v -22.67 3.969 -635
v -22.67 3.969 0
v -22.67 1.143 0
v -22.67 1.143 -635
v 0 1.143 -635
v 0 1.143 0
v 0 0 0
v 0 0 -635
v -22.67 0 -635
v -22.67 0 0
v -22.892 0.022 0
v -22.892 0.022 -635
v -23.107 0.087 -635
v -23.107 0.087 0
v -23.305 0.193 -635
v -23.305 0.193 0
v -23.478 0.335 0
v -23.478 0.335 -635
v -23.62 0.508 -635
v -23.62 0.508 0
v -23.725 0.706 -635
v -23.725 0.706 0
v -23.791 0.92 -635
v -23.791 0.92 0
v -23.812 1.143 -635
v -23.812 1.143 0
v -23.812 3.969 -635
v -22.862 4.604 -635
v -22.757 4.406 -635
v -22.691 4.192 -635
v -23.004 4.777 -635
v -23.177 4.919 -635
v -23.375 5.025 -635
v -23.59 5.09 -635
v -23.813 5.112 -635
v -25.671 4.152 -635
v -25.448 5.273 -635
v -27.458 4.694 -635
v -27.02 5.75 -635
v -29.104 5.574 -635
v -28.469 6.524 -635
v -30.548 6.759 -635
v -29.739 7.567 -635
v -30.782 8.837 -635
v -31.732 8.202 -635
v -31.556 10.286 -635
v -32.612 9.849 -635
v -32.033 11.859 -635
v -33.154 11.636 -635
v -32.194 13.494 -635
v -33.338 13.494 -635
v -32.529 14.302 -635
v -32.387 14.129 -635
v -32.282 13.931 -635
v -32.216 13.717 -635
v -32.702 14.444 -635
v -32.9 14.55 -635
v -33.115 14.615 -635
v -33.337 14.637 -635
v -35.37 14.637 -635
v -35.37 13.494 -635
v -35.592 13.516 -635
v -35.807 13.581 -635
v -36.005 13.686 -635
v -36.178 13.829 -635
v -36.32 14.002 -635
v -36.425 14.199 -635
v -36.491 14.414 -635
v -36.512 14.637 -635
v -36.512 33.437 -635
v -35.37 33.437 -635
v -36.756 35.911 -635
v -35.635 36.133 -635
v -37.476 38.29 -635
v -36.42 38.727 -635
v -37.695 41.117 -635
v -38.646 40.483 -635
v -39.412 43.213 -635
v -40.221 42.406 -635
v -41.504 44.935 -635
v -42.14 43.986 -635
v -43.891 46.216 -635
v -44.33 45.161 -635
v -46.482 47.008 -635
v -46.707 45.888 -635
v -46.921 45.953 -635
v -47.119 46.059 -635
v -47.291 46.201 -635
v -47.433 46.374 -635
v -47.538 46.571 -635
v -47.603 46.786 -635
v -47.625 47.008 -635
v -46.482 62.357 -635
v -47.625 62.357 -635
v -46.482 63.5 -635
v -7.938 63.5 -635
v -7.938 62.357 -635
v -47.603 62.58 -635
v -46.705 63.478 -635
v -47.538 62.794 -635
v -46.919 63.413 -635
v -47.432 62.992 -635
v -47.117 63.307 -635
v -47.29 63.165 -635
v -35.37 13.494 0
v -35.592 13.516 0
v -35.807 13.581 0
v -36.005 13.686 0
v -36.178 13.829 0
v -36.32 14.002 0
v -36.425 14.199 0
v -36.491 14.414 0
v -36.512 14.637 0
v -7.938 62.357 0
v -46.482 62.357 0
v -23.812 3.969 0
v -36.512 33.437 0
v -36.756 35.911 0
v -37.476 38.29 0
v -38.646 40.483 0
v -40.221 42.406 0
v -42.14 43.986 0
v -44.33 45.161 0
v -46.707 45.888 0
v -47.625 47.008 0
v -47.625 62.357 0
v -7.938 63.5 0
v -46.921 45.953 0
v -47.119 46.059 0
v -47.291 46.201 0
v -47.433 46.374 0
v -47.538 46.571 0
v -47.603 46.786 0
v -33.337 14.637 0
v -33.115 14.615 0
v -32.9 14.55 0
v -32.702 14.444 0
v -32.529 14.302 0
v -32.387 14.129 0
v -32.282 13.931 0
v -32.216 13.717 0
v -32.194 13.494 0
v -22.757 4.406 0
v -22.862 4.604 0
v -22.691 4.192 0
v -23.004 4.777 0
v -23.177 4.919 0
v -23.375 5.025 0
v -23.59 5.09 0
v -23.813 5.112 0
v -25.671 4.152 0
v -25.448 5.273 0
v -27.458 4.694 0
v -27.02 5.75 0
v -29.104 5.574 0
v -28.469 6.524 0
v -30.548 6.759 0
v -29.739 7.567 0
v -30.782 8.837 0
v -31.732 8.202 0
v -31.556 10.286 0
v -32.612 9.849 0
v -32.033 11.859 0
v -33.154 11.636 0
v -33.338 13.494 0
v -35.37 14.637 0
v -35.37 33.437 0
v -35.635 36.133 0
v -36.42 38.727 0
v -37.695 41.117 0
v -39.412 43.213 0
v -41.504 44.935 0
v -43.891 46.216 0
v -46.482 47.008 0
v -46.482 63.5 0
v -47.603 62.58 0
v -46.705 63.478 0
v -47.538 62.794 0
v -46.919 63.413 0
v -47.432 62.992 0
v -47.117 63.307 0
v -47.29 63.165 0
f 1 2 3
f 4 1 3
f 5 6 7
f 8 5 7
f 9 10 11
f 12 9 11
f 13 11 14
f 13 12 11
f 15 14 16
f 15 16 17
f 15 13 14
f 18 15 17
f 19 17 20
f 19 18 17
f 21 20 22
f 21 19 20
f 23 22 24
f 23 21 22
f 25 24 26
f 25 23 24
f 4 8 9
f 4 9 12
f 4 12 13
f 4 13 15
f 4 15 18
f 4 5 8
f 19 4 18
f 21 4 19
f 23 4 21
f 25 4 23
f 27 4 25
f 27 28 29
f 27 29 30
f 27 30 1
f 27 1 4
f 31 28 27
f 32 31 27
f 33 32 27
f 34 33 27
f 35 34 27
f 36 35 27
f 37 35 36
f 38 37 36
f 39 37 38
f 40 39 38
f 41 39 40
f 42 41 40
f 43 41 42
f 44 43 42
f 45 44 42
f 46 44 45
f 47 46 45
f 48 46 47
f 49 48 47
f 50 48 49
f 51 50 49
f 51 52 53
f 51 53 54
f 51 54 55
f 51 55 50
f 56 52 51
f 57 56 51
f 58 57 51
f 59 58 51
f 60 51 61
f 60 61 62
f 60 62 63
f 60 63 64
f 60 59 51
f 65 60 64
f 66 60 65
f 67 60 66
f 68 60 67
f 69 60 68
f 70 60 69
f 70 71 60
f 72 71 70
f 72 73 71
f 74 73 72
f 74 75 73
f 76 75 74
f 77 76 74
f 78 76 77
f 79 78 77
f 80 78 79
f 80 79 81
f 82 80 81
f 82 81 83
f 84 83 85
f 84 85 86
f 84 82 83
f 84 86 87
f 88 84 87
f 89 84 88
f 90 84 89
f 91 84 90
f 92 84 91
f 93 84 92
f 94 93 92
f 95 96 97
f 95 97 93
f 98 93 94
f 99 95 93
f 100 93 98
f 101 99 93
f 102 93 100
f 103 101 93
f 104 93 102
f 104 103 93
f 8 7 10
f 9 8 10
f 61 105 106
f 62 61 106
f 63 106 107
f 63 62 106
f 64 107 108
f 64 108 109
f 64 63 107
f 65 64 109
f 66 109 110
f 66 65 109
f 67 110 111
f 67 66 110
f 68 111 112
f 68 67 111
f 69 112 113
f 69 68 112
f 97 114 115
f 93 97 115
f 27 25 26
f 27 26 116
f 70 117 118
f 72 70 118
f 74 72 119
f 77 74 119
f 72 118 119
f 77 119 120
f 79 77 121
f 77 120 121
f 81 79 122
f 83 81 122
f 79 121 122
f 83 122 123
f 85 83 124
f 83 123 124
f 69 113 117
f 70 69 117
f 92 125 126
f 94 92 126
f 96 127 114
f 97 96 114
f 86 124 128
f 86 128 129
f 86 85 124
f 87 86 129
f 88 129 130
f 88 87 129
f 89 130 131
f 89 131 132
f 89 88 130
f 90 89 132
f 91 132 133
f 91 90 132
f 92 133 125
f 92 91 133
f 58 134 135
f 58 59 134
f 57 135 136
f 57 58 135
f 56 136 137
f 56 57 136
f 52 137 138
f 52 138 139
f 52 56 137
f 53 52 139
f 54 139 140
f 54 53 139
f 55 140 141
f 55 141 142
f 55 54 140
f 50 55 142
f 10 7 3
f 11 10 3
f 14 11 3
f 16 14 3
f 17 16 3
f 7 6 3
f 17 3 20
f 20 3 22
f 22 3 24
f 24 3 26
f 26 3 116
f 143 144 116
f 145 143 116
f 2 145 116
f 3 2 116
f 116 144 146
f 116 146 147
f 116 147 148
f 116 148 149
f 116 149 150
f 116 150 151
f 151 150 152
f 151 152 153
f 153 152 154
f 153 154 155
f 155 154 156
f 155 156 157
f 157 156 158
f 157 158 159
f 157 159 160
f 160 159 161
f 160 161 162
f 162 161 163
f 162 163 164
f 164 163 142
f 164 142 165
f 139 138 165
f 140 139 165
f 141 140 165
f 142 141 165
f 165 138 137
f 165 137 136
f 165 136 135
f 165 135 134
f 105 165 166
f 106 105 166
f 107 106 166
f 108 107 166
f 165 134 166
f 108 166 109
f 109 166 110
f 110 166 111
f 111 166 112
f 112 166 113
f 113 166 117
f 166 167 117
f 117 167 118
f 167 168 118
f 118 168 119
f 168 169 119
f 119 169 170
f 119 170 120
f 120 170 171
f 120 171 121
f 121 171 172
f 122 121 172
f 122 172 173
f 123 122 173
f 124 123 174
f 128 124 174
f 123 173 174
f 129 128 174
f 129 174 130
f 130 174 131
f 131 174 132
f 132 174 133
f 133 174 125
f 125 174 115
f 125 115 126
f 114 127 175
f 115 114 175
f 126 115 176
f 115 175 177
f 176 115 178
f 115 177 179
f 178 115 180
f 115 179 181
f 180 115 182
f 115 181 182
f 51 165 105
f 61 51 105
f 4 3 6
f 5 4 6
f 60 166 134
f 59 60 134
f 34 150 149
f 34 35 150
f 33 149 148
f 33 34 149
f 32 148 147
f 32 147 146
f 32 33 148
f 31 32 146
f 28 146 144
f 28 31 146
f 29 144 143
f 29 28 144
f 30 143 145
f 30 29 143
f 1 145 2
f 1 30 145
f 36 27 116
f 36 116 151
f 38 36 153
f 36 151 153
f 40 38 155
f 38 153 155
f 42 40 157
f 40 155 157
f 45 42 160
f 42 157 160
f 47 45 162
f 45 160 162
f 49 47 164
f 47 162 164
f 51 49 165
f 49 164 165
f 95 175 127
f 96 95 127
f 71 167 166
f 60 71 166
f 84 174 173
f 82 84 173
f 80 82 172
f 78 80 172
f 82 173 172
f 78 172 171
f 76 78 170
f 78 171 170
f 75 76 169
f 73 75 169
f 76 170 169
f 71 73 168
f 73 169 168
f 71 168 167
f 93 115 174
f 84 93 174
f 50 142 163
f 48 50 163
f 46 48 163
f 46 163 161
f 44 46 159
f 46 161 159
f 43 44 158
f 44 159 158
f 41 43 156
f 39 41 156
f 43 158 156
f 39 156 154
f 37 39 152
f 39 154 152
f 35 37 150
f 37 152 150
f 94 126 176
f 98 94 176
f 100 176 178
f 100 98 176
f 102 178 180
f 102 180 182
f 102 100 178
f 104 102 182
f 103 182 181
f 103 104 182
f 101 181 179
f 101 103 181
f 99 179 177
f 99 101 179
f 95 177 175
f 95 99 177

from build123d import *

# Parameters (mm, degrees)
EXTRUDE_THIN1_DEPTH = 635
FILLET1_R           = 1.143


with BuildPart() as part:
    # Sketch1 → Extrude-Thin1 (new body)
    with BuildSketch(Plane.XY):
        with BuildLine():
            Line((0, 0), (-23.8125, 0))
            Line((-23.8125, 0), (-23.8125, 3.96875))
            ThreePointArc((-23.8125, 3.96875), (-30.547692, 6.758558), (-33.3375, 13.49375))
            Line((-33.3375, 13.49375), (-36.5125, 13.49375))
            Line((-36.5125, 13.49375), (-36.5125, 33.437109))
            ThreePointArc((-36.5125, 33.437109), (-39.6875, 41.83737), (-47.625, 46.0375))
            Line((-47.625, 46.0375), (-47.625, 63.5))
            Line((-47.625, 63.5), (-7.9375, 63.5))
            Line((-7.9375, 63.5), (-7.9375, 62.357))
            Line((-7.9375, 62.357), (-46.482, 62.357))
            Line((-46.482, 62.357), (-46.482, 47.008145))
            ThreePointArc((-46.482, 47.008145), (-38.502062, 42.207239), (-35.3695, 33.437109))
            Line((-35.3695, 33.437109), (-35.3695, 14.63675))
            Line((-35.3695, 14.63675), (-32.116202, 14.63675))
            ThreePointArc((-32.116202, 14.63675), (-29.739469, 7.566781), (-22.6695, 5.190048))
            Line((-22.6695, 5.190048), (-22.6695, 1.143))
            Line((-22.6695, 1.143), (0, 1.143))
            Line((0, 1.143), (0, 0))
        make_face()
    extrude(amount=-EXTRUDE_THIN1_DEPTH)

    # Fillet1
    fillet1_edges = [part.edges().sort_by_distance(p)[0] for p in [
        (-32.116202, 14.63675, -317.5),
        (-22.6695, 5.190048, -317.5),
        (-23.8125, 0, -317.5),
        (-36.5125, 13.49375, -317.5),
        (-47.625, 46.0375, -317.5),
        (-47.625, 63.5, -317.5),
    ]]
    fillet(fillet1_edges, radius=FILLET1_R)


solid = part.part
